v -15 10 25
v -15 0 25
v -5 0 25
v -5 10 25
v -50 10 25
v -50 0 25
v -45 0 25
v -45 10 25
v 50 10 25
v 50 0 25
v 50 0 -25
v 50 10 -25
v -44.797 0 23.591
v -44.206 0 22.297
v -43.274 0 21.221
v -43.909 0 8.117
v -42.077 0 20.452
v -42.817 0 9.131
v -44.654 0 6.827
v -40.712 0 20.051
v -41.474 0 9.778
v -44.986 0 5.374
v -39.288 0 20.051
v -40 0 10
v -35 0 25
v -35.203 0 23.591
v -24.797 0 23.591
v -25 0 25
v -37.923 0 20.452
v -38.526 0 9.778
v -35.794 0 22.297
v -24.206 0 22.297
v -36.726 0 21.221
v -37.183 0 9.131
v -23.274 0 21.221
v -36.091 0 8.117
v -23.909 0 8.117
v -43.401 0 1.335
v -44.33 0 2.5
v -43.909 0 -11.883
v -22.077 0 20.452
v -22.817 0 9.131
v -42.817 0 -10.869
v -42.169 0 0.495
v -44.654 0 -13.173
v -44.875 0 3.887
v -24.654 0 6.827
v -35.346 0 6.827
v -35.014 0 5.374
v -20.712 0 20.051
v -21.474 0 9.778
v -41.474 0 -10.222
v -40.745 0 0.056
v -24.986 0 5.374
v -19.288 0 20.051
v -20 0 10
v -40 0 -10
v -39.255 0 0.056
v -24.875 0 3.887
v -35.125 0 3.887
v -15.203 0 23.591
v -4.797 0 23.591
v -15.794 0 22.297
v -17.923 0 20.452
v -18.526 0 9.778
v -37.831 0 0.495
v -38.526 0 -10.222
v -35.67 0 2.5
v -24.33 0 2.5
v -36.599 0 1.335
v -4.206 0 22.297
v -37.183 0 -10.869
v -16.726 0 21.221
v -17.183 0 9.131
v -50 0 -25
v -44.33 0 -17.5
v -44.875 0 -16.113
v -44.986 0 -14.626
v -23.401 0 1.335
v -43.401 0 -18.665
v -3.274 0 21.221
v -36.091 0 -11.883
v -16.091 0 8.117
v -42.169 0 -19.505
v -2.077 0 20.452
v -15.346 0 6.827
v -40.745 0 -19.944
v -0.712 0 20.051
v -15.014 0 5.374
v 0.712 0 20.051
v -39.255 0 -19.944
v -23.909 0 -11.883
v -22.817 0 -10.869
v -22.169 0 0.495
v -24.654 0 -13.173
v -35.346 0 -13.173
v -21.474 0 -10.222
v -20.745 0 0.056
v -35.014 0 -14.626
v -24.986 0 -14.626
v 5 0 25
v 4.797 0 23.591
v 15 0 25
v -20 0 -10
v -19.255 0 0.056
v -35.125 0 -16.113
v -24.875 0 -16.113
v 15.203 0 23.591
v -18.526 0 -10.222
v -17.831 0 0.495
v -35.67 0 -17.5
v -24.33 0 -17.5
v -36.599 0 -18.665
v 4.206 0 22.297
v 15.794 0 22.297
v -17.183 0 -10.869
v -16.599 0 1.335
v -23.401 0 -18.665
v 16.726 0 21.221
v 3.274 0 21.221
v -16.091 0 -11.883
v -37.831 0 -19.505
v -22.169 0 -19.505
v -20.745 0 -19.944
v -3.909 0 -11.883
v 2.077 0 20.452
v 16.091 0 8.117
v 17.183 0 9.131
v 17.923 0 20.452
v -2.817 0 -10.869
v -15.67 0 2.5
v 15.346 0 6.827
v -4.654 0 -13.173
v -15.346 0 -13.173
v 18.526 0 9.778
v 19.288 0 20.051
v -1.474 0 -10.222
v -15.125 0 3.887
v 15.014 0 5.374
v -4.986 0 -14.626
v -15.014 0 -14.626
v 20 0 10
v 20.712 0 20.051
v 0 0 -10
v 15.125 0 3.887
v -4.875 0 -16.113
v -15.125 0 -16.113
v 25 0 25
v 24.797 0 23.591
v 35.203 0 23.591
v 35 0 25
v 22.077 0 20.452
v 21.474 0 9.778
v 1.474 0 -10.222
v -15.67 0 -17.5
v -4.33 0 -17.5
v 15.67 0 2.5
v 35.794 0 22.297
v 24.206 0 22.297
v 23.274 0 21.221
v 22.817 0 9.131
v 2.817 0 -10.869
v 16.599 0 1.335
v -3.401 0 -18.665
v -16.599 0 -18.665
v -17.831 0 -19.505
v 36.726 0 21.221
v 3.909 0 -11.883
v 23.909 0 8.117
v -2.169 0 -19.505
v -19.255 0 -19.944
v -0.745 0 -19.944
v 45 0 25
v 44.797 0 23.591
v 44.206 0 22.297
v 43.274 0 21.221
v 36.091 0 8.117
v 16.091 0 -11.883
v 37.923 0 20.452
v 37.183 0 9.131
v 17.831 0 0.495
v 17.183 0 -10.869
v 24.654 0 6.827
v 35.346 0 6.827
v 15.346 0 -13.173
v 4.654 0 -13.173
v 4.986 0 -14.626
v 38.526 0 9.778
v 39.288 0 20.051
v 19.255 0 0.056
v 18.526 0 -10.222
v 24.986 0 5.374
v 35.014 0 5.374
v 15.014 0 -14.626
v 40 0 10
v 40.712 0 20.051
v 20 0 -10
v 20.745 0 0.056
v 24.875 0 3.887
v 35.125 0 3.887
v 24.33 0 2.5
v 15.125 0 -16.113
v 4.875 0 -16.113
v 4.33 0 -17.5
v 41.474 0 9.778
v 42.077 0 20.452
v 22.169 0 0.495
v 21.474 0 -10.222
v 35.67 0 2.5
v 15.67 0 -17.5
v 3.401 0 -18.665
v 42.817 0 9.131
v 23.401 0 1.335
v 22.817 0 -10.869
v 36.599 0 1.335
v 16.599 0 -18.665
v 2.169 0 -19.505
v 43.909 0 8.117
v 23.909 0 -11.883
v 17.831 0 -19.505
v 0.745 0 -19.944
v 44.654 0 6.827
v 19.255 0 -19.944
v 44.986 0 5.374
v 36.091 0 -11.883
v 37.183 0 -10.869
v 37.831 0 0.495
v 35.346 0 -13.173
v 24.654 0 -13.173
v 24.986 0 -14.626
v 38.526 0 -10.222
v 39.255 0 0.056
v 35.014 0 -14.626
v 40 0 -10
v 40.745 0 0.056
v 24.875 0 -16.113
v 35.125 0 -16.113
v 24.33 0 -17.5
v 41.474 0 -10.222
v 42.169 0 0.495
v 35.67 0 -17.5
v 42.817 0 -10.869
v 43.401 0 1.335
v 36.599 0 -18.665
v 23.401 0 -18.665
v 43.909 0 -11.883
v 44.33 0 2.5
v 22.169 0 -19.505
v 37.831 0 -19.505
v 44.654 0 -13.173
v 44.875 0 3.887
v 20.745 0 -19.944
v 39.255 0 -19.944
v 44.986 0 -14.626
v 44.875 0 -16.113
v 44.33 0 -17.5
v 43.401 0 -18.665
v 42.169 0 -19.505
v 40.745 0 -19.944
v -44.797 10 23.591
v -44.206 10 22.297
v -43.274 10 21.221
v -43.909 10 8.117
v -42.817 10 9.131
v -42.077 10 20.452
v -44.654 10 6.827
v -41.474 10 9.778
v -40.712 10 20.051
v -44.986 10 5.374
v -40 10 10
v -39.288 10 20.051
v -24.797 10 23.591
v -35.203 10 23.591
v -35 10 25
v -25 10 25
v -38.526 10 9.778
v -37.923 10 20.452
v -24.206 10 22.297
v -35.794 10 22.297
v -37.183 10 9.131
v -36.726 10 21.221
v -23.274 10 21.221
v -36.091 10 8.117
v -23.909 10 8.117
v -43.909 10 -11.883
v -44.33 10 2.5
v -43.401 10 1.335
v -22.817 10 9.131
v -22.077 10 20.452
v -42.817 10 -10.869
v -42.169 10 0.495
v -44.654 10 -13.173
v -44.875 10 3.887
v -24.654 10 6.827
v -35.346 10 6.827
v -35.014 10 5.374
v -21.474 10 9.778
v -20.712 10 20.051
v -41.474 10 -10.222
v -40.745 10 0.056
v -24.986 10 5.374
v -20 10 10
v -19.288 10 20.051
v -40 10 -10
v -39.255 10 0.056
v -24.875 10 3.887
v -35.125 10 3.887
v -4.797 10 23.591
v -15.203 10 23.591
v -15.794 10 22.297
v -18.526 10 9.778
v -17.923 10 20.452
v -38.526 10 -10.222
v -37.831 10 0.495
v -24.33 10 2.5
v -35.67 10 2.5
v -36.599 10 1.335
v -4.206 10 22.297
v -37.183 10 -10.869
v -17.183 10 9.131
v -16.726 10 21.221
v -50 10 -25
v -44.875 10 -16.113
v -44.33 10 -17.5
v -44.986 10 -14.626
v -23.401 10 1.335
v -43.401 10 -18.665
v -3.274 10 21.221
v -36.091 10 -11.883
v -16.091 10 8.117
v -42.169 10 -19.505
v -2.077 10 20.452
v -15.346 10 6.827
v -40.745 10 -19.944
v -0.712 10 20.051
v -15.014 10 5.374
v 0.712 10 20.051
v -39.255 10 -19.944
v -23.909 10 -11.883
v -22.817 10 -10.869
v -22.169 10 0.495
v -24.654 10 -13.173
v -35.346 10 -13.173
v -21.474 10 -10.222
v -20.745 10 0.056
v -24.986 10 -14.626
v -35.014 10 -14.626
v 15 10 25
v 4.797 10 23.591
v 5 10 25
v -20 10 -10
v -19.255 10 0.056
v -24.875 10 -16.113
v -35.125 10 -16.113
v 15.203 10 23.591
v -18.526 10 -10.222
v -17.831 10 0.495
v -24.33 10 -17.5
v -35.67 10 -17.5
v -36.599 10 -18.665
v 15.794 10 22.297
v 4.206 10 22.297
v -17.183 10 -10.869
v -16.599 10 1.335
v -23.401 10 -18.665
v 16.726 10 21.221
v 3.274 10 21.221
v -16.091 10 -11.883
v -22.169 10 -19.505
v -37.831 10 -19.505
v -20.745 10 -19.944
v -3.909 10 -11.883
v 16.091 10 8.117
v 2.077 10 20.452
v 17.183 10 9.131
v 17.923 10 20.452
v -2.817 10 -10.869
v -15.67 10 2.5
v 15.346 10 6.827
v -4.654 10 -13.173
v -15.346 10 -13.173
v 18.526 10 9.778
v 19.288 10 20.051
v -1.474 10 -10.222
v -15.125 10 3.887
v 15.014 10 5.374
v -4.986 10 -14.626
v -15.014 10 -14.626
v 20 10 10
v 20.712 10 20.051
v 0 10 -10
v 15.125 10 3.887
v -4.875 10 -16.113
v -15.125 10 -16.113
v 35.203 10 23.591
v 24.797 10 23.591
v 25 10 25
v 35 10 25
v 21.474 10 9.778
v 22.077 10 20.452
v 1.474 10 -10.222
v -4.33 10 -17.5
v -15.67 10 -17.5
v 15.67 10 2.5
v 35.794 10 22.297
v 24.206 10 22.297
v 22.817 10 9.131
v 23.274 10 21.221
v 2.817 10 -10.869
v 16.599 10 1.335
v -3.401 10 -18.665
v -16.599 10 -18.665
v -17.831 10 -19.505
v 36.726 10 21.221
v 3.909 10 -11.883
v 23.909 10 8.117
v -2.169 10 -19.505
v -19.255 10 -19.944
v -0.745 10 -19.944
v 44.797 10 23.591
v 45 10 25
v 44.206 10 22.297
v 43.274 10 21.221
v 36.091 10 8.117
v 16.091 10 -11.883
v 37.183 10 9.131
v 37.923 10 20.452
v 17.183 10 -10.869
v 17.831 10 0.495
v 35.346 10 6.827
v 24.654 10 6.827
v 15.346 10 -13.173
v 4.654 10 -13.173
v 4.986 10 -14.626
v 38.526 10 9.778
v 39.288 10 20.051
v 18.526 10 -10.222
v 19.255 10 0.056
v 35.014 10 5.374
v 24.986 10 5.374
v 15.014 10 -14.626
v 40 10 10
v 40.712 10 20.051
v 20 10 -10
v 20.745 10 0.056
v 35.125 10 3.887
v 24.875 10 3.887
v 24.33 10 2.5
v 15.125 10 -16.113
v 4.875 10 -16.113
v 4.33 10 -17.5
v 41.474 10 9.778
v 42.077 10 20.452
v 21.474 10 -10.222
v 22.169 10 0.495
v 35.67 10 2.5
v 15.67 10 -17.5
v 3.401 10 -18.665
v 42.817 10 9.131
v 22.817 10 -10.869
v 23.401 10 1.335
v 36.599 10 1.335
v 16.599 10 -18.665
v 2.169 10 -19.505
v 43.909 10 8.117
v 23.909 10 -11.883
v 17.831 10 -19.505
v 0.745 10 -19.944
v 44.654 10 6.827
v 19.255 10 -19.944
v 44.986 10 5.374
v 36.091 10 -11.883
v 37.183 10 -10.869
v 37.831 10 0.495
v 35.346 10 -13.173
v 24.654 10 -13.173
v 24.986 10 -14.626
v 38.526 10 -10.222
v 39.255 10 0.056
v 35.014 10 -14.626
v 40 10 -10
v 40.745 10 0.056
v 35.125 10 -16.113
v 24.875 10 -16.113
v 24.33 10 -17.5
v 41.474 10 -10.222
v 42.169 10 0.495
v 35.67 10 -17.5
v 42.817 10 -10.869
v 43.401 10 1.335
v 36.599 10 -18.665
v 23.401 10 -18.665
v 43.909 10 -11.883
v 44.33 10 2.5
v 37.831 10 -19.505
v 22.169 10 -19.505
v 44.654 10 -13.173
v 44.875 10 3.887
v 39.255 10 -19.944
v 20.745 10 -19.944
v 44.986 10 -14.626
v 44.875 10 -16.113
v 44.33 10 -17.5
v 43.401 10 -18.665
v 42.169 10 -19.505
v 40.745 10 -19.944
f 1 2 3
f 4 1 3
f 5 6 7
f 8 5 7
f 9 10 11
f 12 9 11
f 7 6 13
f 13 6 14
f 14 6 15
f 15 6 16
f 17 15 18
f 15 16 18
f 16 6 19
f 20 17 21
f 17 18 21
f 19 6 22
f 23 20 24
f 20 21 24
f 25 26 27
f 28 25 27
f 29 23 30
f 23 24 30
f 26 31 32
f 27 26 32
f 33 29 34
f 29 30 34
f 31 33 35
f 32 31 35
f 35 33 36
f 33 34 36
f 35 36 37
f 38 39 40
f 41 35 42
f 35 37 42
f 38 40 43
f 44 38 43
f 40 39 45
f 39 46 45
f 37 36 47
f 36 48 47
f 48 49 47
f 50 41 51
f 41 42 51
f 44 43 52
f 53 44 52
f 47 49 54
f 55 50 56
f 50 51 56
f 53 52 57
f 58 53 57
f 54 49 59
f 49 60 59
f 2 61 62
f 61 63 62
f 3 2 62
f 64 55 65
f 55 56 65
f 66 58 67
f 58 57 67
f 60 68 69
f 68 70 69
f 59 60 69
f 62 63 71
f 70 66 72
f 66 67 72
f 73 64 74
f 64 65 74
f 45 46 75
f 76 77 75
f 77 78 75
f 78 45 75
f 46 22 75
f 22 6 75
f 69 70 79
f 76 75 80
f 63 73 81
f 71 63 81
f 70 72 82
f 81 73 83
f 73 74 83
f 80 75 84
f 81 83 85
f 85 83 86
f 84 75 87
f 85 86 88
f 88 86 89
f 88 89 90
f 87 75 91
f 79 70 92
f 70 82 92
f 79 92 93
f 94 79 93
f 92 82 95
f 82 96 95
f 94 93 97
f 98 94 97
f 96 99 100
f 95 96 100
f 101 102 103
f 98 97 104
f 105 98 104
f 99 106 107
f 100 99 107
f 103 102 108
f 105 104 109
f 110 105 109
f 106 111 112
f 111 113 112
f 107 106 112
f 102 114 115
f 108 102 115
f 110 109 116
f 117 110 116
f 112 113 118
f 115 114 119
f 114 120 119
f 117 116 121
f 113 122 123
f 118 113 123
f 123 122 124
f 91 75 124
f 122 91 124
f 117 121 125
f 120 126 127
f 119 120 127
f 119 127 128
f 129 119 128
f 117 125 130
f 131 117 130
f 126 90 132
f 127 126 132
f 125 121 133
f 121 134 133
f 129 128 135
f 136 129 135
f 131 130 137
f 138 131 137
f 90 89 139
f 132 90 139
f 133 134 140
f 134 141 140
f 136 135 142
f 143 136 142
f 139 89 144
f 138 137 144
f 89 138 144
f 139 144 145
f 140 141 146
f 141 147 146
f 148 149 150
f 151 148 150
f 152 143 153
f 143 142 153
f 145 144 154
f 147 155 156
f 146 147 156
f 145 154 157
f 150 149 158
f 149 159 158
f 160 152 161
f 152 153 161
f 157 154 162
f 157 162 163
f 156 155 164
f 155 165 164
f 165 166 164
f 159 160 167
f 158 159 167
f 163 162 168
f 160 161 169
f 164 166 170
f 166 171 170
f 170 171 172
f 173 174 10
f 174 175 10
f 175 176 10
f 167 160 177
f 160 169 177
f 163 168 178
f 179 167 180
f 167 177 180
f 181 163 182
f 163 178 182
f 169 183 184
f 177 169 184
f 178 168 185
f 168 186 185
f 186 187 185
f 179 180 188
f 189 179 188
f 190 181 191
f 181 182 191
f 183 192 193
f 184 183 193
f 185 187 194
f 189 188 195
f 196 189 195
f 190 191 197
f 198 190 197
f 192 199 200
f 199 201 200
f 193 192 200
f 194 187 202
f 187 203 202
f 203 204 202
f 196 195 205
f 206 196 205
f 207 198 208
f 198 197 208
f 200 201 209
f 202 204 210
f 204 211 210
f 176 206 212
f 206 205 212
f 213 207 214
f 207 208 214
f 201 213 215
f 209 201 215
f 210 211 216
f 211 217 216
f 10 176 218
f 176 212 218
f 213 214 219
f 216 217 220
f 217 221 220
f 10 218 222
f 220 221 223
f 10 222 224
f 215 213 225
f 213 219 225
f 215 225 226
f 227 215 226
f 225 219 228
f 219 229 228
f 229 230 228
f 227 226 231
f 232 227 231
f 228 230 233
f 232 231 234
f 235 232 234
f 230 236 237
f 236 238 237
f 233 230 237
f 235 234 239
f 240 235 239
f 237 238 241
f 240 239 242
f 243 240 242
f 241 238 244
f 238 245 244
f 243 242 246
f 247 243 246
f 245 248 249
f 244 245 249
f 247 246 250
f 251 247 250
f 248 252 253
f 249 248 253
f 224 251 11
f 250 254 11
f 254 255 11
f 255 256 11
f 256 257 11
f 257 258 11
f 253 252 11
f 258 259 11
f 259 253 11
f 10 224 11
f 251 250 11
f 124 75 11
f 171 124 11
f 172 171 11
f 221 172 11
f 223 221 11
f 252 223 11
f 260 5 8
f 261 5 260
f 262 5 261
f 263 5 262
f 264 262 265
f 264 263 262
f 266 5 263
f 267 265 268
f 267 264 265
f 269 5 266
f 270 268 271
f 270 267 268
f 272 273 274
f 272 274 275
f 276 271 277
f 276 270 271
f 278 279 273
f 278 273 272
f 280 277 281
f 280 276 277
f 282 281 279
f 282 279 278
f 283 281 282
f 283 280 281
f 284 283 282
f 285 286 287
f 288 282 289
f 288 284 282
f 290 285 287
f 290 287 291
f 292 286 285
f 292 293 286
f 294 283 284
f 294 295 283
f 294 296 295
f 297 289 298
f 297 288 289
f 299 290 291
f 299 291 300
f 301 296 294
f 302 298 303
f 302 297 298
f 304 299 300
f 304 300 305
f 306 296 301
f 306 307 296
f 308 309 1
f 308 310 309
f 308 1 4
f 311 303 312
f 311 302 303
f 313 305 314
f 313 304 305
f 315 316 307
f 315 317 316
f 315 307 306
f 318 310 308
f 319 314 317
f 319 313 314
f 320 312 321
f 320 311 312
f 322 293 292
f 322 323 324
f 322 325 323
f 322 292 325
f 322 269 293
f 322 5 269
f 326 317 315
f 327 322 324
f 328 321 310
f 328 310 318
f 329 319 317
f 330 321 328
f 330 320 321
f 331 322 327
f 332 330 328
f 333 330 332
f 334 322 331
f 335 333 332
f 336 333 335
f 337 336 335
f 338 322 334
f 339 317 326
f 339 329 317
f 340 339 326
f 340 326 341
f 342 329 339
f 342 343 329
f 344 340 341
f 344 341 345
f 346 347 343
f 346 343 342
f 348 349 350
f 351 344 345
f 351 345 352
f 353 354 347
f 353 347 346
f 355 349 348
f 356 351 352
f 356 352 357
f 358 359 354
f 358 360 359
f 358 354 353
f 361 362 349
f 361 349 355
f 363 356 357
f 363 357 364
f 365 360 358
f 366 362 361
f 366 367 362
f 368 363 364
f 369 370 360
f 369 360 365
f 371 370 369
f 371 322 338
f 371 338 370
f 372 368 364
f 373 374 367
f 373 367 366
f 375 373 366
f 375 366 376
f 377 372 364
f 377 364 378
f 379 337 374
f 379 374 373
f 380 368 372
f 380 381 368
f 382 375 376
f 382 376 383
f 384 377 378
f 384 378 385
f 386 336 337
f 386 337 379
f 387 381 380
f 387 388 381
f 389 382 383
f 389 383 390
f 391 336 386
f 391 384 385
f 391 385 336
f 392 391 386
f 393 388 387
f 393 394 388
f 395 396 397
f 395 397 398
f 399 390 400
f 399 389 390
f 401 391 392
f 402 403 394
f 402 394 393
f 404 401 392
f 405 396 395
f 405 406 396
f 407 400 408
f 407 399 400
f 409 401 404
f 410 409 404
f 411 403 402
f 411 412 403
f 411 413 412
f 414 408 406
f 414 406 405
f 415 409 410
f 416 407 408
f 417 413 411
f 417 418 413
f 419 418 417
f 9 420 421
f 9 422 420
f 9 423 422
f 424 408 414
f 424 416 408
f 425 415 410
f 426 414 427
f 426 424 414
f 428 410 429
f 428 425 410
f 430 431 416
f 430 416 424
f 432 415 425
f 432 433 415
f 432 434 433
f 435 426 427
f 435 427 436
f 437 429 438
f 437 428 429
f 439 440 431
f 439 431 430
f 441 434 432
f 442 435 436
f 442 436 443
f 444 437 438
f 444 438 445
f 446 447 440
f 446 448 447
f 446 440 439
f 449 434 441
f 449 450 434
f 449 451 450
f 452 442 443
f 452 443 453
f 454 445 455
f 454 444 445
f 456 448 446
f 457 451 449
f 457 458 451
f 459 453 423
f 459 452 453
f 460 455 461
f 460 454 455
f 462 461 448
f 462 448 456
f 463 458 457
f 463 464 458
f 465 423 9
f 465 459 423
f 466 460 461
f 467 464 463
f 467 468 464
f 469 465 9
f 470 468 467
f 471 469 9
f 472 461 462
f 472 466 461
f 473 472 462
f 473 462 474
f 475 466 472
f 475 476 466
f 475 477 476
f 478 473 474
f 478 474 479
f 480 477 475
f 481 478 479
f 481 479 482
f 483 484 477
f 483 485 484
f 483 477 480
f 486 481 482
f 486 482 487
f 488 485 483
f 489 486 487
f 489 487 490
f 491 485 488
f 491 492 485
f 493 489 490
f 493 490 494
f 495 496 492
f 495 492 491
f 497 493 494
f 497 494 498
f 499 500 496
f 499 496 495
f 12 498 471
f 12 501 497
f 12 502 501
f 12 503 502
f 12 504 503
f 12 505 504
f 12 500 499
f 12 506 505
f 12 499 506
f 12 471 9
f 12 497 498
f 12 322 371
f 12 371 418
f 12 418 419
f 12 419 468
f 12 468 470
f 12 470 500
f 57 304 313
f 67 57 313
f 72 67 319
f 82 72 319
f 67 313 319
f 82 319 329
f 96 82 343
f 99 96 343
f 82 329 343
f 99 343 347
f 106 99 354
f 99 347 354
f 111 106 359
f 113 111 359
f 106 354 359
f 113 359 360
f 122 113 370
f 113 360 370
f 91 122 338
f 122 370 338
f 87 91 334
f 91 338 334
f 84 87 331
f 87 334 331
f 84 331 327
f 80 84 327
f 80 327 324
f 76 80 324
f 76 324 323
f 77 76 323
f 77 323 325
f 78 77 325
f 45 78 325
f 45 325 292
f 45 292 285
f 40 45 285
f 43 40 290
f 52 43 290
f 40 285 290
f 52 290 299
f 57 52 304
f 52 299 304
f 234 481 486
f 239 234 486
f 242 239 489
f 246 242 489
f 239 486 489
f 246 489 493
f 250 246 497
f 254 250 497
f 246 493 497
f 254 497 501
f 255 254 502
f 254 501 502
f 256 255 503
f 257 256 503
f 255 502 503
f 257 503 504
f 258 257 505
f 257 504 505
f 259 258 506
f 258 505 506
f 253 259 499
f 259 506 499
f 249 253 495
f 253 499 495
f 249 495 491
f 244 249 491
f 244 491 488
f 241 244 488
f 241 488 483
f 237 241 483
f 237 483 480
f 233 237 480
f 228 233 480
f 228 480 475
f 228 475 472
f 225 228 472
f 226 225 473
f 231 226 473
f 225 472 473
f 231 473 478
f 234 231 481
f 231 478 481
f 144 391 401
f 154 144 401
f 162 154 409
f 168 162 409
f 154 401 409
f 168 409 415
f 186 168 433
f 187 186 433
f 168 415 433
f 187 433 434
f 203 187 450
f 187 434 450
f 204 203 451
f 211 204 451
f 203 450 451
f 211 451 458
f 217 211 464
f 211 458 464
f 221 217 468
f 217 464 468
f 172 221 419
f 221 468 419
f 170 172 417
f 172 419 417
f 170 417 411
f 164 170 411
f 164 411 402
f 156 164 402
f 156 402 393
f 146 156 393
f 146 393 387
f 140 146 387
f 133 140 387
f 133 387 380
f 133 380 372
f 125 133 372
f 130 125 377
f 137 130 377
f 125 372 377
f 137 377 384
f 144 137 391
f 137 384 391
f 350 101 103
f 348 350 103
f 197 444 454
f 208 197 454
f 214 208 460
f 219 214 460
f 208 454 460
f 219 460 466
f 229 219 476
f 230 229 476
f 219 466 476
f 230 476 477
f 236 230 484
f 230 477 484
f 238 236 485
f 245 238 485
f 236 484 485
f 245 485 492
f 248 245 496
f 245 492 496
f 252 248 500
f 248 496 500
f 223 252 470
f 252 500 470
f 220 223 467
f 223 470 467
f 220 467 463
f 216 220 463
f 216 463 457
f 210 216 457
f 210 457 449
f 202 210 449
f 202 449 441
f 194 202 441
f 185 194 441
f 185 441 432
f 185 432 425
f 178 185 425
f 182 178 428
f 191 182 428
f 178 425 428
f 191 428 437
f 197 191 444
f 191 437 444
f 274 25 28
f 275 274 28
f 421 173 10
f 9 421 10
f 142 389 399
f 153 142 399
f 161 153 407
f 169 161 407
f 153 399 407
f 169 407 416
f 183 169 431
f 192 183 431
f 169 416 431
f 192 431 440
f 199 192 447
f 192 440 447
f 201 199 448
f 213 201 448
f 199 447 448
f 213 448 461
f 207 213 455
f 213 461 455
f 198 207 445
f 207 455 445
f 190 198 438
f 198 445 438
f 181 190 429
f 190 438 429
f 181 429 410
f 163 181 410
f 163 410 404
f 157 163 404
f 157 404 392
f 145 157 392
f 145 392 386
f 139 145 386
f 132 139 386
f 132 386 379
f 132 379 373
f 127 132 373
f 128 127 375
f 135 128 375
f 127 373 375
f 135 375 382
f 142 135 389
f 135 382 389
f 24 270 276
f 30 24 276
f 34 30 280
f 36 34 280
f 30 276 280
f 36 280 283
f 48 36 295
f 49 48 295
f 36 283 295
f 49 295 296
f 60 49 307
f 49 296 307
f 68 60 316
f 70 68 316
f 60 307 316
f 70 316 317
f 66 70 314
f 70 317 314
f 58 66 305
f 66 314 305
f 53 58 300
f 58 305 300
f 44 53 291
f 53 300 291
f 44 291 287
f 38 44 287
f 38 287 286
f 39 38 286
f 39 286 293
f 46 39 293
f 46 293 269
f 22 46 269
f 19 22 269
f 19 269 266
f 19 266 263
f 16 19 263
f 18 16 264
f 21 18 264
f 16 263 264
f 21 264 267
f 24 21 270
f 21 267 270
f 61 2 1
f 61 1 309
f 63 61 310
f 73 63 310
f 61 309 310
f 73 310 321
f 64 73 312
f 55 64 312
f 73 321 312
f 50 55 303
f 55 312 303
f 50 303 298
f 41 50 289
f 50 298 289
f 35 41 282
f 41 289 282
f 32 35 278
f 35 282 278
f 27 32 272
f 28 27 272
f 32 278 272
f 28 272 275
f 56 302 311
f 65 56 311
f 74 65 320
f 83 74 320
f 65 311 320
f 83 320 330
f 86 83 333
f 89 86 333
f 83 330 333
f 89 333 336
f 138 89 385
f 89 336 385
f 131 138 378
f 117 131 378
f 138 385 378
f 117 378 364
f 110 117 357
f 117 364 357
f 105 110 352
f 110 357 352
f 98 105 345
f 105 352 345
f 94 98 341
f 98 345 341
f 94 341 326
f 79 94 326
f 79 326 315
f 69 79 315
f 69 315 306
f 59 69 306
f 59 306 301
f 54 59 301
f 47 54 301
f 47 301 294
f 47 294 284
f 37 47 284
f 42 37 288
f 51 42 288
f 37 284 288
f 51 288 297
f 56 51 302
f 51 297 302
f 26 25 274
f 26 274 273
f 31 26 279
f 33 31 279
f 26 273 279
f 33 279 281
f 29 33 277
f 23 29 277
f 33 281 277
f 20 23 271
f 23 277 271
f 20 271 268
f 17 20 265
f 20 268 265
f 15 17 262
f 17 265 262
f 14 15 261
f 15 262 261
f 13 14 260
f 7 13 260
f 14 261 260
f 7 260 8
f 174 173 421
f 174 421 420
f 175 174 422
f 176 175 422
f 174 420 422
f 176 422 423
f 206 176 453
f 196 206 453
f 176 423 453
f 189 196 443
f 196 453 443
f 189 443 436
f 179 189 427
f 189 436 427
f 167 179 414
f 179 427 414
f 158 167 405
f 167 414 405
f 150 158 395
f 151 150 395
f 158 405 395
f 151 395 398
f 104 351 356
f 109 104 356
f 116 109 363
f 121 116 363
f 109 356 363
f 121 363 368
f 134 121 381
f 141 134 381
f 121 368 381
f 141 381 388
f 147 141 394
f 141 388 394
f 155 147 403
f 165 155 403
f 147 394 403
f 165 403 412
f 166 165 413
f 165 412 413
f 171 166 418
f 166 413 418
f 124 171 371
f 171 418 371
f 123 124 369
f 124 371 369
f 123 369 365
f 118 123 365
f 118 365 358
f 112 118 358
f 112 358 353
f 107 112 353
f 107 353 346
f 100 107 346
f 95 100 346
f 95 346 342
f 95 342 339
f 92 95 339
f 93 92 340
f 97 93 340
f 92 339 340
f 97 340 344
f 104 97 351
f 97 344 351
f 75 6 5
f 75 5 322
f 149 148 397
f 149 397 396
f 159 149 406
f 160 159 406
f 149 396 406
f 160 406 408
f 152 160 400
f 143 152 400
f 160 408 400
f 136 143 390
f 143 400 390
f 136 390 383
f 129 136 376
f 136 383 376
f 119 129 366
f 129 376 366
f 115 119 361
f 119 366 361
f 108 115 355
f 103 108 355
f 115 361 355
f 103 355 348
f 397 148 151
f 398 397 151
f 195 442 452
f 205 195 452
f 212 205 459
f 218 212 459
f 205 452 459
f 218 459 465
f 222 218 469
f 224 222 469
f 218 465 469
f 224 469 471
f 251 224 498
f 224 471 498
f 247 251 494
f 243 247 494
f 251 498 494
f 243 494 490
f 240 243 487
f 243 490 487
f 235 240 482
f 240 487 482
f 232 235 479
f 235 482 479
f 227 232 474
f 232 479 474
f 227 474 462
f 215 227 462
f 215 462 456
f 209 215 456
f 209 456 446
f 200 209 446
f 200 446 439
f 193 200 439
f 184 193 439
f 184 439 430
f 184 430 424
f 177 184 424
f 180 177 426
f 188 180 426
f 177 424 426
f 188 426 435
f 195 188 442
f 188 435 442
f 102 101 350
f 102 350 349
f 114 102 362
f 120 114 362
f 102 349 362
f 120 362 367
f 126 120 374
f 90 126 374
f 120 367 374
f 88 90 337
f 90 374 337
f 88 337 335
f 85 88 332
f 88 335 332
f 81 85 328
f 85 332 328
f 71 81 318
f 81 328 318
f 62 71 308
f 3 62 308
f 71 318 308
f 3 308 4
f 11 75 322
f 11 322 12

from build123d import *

# Parameters (mm, degrees)
SKETCH1_W            = 100
SKETCH1_H            = 50
BOSS_EXTRUDE1_DEPTH  = 10
SKETCH2_R            = 5
CUT_EXTRUDE1_DEPTH   = 10
LPATTERN1_COUNT      = 5
LPATTERN1_PITCH      = 20
LPATTERN1_COUNT_DIR2 = 3
LPATTERN1_PITCH_DIR2 = 20


with BuildPart() as part:
    # Sketch1 → Boss-Extrude1 (new body)
    with BuildSketch(Plane(origin=(0, 0, 0), x_dir=(1, 0, 0), z_dir=(0, 1, 0))):
        Rectangle(SKETCH1_W, SKETCH1_H)
    extrude(amount=BOSS_EXTRUDE1_DEPTH)

    # Sketch2 → Cut-Extrude1 (cut)
    with BuildSketch(Plane(origin=(0, 10, 0), x_dir=(1, 0, 0), z_dir=(0, 1, 0))):
        with Locations(Location((-40, 15, 0), (0, 0, 270))):
            Circle(SKETCH2_R)
    cut_extrude1 = extrude(amount=-CUT_EXTRUDE1_DEPTH, mode=Mode.SUBTRACT)

    # LPattern1: Cut-Extrude1 5 × 3, 1 skipped
    with Locations(*[(i * LPATTERN1_PITCH, 0, j * LPATTERN1_PITCH_DIR2) for i in range(LPATTERN1_COUNT) for j in range(LPATTERN1_COUNT_DIR2) if (i, j) not in ((0, 0), (2, 1))]):
        add(cut_extrude1, mode=Mode.SUBTRACT)


solid = part.part
